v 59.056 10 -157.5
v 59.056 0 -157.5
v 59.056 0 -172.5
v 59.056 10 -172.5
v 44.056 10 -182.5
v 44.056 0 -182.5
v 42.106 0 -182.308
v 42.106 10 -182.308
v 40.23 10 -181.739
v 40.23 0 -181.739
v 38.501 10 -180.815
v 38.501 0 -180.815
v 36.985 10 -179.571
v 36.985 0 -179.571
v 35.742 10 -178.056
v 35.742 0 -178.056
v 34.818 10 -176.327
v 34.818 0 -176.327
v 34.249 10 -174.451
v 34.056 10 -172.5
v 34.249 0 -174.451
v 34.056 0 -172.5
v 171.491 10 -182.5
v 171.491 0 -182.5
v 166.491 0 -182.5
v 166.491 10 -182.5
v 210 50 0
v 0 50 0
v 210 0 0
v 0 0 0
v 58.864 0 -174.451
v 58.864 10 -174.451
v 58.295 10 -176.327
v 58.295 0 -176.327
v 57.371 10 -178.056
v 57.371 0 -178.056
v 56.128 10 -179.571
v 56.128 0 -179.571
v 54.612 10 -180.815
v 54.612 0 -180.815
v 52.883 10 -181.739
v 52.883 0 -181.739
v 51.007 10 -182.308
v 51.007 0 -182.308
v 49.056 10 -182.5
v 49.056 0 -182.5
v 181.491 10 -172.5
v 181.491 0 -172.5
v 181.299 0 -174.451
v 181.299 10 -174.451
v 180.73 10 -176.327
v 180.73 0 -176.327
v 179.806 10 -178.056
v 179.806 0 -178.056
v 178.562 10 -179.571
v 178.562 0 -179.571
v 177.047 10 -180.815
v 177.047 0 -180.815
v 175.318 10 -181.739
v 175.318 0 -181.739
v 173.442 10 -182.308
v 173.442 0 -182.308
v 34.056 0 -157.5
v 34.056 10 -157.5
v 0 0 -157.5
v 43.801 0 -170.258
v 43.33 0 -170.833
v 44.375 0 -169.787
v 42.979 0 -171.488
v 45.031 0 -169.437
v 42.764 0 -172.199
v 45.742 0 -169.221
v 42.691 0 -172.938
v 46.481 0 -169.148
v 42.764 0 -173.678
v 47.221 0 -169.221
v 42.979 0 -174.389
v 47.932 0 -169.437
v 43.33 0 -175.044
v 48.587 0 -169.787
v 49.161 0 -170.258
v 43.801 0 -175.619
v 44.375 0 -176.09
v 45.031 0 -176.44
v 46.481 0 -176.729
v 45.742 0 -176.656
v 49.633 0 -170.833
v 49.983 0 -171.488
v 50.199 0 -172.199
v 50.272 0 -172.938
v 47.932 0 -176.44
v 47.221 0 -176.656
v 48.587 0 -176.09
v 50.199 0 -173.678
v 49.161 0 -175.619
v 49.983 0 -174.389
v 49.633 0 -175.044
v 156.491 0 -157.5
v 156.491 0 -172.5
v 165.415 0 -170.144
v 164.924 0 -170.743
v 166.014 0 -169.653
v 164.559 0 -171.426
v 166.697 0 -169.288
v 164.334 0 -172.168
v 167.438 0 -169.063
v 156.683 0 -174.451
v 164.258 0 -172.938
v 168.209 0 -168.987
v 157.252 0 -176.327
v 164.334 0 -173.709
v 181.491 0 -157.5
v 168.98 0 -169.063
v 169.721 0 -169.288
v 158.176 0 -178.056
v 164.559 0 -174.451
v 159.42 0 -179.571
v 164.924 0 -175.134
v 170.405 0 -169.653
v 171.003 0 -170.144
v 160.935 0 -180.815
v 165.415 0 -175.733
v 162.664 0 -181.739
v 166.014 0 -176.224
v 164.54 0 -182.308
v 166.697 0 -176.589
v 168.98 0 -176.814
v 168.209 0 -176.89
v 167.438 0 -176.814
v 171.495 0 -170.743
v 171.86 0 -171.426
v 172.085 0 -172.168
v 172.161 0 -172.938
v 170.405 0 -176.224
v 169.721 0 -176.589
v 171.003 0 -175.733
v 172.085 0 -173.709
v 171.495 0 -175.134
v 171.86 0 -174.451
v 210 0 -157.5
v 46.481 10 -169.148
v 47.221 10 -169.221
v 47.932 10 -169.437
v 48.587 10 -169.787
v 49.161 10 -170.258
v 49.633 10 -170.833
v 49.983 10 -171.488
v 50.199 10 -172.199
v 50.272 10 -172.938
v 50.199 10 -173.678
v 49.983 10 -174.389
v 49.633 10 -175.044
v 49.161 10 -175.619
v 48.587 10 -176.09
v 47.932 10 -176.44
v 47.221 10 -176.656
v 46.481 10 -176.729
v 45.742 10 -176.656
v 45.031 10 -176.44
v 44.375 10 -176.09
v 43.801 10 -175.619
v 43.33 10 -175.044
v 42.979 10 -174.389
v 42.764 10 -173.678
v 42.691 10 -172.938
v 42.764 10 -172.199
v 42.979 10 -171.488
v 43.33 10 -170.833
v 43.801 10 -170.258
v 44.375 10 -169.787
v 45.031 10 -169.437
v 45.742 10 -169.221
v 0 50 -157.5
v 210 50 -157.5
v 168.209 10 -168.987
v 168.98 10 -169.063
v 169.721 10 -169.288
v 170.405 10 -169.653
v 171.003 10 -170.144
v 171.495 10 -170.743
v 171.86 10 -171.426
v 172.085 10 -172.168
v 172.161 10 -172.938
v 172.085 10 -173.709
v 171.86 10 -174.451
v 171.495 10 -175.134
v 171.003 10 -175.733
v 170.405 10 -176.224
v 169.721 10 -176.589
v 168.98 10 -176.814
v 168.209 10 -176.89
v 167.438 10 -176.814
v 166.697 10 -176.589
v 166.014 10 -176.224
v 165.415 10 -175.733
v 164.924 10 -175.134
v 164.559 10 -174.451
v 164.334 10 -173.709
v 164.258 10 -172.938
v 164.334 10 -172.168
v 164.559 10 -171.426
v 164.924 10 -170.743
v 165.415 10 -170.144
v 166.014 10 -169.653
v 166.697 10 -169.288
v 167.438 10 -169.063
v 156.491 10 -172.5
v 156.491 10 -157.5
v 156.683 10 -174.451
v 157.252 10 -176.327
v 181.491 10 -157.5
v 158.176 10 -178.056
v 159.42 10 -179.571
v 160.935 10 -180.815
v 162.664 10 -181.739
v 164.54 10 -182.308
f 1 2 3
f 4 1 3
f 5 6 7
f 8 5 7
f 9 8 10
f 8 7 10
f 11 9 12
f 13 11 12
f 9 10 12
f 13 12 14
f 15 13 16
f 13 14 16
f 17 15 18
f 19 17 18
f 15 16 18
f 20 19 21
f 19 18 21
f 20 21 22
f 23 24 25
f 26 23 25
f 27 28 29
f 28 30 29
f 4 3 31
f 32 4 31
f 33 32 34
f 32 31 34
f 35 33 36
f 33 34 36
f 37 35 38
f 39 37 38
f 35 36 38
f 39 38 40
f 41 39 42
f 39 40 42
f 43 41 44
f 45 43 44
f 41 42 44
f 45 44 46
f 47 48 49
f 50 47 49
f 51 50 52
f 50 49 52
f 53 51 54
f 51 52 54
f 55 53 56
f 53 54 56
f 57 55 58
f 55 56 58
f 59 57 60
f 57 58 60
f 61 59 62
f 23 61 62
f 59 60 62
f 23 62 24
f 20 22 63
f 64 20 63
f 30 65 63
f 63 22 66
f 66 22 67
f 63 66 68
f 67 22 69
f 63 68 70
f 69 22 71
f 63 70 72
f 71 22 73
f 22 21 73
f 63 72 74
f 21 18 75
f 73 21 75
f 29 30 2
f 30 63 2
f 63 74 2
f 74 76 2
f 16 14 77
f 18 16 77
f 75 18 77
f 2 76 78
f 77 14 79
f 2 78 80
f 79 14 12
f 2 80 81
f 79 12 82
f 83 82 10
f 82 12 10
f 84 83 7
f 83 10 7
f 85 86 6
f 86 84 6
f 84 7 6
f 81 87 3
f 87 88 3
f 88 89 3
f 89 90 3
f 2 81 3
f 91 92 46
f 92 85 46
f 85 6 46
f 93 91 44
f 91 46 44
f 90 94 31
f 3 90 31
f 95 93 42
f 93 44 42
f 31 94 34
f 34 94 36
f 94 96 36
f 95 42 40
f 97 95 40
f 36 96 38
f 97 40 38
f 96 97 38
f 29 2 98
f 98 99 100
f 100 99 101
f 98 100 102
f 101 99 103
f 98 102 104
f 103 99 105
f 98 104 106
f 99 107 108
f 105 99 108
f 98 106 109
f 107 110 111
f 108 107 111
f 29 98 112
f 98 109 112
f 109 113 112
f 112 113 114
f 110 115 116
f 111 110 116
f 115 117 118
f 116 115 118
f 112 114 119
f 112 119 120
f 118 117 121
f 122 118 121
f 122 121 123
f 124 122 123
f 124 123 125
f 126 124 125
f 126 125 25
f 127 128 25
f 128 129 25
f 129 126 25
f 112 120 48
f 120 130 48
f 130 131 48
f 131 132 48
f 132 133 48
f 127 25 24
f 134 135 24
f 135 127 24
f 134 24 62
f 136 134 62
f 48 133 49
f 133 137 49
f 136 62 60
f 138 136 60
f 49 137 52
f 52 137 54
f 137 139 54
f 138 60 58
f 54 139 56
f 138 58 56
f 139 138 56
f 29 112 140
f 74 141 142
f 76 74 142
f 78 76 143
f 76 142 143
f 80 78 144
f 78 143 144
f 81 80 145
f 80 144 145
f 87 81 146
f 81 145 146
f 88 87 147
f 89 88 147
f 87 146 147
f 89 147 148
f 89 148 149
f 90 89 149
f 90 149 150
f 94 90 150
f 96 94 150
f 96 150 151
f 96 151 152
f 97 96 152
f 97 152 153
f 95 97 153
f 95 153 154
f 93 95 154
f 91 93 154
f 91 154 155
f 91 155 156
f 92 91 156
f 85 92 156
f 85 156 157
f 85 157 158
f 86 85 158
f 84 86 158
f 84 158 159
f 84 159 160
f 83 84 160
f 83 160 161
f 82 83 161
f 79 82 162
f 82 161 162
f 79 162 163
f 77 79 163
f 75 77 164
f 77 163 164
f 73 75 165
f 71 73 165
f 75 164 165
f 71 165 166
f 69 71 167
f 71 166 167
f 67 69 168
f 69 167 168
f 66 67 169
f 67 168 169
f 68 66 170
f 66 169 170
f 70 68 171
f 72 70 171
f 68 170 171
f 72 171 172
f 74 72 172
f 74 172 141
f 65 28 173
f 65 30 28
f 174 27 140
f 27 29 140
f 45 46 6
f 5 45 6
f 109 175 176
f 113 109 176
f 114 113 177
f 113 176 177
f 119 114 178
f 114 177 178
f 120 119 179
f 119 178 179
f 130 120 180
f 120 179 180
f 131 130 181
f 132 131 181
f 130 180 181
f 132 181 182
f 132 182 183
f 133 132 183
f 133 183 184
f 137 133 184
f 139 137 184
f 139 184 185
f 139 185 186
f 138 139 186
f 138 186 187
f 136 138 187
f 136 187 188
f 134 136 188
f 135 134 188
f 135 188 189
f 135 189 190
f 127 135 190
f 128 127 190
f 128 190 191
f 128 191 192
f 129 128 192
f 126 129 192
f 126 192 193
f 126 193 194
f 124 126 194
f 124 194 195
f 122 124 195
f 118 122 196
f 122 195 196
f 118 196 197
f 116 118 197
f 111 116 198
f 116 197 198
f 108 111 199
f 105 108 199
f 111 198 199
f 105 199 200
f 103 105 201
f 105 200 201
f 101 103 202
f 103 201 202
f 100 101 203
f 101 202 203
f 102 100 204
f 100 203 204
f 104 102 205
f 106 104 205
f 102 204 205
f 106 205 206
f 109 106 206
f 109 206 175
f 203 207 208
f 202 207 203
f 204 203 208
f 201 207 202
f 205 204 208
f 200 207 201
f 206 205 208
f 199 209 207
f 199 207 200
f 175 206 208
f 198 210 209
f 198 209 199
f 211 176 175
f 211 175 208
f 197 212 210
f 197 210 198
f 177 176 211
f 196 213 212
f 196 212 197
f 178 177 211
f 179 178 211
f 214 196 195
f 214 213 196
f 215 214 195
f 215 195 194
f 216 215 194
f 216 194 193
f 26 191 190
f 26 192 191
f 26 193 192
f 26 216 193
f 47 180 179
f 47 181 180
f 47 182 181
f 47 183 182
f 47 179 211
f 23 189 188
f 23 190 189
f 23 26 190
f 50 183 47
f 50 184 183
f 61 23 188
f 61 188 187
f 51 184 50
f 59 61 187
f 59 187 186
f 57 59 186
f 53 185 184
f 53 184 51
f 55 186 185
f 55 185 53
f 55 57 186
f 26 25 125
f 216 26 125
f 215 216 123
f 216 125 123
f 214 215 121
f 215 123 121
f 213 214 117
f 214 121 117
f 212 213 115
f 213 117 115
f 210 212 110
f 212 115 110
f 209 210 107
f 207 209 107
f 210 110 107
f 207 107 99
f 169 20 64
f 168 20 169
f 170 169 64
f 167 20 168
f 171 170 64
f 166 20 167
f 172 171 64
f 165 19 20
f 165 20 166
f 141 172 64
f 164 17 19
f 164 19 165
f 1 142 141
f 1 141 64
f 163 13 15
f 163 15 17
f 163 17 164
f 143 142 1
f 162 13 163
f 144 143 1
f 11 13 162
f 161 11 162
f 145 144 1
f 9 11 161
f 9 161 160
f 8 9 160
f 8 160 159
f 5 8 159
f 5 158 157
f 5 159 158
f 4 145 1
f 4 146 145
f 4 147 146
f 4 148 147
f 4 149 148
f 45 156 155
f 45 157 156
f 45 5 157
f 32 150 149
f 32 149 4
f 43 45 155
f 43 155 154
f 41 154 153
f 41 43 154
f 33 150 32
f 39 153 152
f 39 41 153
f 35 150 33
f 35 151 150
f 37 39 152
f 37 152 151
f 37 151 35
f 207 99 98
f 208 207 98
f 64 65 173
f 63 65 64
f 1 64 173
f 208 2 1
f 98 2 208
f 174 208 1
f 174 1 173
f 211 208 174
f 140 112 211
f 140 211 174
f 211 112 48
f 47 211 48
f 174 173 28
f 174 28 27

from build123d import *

# Parameters (mm, degrees)
SKETCH_1_W          = 210
SKETCH_1_H          = 157.5
EXTRUDE_1_DEPTH     = 10
SKETCH_2_W          = 210
SKETCH_2_H          = 157.5
EXTRUDE_2_DEPTH     = 40
SKETCH_3_R          = 3.79044749
SKETCH_3_R_2        = 3.951540246
CUT_EXTRUDE_1_DEPTH = 40


with BuildPart() as part:
    # 草图1 → 凸台-拉伸1 (new body)
    with BuildSketch(Plane(origin=(0, 0, 0), x_dir=(1, 0, 0), z_dir=(0, 1, 0))):
        with Locations((105, 78.75)):
            Rectangle(SKETCH_1_W, SKETCH_1_H)
        with BuildLine():
            Line((34.056494748, 172.5), (34.056494748, 157.5))
            Line((34.056494748, 157.5), (59.056494748, 157.5))
            Line((59.056494748, 157.5), (59.056494748, 172.5))
            ThreePointArc((59.056494748, 172.5), (56.12756256, 179.571067812), (49.056494748, 182.5))
            Line((49.056494748, 182.5), (44.056494748, 182.5))
            ThreePointArc((44.056494748, 182.5), (36.985426936, 179.571067812), (34.056494748, 172.5))
        make_face()
        with BuildLine():
            Line((156.491132728, 157.5), (181.491132728, 157.5))
            Line((181.491132728, 157.5), (181.491132728, 172.5))
            ThreePointArc((181.491132728, 172.5), (178.56220054, 179.571067812), (171.491132728, 182.5))
            Line((171.491132728, 182.5), (166.491132728, 182.5))
            ThreePointArc((166.491132728, 182.5), (159.420064916, 179.571067812), (156.491132728, 172.5))
            Line((156.491132728, 172.5), (156.491132728, 157.5))
        make_face()
    extrude(amount=EXTRUDE_1_DEPTH)

    # 草图2 → 凸台-拉伸2 (add)
    with BuildSketch(Plane(origin=(0, 10, 0), x_dir=(1, 0, 0), z_dir=(0, 1, 0))):
        with Locations((105, 78.75)):
            Rectangle(SKETCH_2_W, SKETCH_2_H)
    extrude(amount=EXTRUDE_2_DEPTH)

    # 草图3 → 切除-拉伸1 (cut)
    with BuildSketch(Plane(origin=(0, 10, 0), x_dir=(1, 0, 0), z_dir=(0, 1, 0))):
        with Locations(Location((46.4811838, 172.938422578, 0), (0, 0, 270))):
            Circle(SKETCH_3_R)
        with Locations(Location((168.209255667, 172.938422578, 0), (0, 0, 270))):
            Circle(SKETCH_3_R_2)
    extrude(amount=-CUT_EXTRUDE_1_DEPTH, mode=Mode.SUBTRACT)


solid = part.part
